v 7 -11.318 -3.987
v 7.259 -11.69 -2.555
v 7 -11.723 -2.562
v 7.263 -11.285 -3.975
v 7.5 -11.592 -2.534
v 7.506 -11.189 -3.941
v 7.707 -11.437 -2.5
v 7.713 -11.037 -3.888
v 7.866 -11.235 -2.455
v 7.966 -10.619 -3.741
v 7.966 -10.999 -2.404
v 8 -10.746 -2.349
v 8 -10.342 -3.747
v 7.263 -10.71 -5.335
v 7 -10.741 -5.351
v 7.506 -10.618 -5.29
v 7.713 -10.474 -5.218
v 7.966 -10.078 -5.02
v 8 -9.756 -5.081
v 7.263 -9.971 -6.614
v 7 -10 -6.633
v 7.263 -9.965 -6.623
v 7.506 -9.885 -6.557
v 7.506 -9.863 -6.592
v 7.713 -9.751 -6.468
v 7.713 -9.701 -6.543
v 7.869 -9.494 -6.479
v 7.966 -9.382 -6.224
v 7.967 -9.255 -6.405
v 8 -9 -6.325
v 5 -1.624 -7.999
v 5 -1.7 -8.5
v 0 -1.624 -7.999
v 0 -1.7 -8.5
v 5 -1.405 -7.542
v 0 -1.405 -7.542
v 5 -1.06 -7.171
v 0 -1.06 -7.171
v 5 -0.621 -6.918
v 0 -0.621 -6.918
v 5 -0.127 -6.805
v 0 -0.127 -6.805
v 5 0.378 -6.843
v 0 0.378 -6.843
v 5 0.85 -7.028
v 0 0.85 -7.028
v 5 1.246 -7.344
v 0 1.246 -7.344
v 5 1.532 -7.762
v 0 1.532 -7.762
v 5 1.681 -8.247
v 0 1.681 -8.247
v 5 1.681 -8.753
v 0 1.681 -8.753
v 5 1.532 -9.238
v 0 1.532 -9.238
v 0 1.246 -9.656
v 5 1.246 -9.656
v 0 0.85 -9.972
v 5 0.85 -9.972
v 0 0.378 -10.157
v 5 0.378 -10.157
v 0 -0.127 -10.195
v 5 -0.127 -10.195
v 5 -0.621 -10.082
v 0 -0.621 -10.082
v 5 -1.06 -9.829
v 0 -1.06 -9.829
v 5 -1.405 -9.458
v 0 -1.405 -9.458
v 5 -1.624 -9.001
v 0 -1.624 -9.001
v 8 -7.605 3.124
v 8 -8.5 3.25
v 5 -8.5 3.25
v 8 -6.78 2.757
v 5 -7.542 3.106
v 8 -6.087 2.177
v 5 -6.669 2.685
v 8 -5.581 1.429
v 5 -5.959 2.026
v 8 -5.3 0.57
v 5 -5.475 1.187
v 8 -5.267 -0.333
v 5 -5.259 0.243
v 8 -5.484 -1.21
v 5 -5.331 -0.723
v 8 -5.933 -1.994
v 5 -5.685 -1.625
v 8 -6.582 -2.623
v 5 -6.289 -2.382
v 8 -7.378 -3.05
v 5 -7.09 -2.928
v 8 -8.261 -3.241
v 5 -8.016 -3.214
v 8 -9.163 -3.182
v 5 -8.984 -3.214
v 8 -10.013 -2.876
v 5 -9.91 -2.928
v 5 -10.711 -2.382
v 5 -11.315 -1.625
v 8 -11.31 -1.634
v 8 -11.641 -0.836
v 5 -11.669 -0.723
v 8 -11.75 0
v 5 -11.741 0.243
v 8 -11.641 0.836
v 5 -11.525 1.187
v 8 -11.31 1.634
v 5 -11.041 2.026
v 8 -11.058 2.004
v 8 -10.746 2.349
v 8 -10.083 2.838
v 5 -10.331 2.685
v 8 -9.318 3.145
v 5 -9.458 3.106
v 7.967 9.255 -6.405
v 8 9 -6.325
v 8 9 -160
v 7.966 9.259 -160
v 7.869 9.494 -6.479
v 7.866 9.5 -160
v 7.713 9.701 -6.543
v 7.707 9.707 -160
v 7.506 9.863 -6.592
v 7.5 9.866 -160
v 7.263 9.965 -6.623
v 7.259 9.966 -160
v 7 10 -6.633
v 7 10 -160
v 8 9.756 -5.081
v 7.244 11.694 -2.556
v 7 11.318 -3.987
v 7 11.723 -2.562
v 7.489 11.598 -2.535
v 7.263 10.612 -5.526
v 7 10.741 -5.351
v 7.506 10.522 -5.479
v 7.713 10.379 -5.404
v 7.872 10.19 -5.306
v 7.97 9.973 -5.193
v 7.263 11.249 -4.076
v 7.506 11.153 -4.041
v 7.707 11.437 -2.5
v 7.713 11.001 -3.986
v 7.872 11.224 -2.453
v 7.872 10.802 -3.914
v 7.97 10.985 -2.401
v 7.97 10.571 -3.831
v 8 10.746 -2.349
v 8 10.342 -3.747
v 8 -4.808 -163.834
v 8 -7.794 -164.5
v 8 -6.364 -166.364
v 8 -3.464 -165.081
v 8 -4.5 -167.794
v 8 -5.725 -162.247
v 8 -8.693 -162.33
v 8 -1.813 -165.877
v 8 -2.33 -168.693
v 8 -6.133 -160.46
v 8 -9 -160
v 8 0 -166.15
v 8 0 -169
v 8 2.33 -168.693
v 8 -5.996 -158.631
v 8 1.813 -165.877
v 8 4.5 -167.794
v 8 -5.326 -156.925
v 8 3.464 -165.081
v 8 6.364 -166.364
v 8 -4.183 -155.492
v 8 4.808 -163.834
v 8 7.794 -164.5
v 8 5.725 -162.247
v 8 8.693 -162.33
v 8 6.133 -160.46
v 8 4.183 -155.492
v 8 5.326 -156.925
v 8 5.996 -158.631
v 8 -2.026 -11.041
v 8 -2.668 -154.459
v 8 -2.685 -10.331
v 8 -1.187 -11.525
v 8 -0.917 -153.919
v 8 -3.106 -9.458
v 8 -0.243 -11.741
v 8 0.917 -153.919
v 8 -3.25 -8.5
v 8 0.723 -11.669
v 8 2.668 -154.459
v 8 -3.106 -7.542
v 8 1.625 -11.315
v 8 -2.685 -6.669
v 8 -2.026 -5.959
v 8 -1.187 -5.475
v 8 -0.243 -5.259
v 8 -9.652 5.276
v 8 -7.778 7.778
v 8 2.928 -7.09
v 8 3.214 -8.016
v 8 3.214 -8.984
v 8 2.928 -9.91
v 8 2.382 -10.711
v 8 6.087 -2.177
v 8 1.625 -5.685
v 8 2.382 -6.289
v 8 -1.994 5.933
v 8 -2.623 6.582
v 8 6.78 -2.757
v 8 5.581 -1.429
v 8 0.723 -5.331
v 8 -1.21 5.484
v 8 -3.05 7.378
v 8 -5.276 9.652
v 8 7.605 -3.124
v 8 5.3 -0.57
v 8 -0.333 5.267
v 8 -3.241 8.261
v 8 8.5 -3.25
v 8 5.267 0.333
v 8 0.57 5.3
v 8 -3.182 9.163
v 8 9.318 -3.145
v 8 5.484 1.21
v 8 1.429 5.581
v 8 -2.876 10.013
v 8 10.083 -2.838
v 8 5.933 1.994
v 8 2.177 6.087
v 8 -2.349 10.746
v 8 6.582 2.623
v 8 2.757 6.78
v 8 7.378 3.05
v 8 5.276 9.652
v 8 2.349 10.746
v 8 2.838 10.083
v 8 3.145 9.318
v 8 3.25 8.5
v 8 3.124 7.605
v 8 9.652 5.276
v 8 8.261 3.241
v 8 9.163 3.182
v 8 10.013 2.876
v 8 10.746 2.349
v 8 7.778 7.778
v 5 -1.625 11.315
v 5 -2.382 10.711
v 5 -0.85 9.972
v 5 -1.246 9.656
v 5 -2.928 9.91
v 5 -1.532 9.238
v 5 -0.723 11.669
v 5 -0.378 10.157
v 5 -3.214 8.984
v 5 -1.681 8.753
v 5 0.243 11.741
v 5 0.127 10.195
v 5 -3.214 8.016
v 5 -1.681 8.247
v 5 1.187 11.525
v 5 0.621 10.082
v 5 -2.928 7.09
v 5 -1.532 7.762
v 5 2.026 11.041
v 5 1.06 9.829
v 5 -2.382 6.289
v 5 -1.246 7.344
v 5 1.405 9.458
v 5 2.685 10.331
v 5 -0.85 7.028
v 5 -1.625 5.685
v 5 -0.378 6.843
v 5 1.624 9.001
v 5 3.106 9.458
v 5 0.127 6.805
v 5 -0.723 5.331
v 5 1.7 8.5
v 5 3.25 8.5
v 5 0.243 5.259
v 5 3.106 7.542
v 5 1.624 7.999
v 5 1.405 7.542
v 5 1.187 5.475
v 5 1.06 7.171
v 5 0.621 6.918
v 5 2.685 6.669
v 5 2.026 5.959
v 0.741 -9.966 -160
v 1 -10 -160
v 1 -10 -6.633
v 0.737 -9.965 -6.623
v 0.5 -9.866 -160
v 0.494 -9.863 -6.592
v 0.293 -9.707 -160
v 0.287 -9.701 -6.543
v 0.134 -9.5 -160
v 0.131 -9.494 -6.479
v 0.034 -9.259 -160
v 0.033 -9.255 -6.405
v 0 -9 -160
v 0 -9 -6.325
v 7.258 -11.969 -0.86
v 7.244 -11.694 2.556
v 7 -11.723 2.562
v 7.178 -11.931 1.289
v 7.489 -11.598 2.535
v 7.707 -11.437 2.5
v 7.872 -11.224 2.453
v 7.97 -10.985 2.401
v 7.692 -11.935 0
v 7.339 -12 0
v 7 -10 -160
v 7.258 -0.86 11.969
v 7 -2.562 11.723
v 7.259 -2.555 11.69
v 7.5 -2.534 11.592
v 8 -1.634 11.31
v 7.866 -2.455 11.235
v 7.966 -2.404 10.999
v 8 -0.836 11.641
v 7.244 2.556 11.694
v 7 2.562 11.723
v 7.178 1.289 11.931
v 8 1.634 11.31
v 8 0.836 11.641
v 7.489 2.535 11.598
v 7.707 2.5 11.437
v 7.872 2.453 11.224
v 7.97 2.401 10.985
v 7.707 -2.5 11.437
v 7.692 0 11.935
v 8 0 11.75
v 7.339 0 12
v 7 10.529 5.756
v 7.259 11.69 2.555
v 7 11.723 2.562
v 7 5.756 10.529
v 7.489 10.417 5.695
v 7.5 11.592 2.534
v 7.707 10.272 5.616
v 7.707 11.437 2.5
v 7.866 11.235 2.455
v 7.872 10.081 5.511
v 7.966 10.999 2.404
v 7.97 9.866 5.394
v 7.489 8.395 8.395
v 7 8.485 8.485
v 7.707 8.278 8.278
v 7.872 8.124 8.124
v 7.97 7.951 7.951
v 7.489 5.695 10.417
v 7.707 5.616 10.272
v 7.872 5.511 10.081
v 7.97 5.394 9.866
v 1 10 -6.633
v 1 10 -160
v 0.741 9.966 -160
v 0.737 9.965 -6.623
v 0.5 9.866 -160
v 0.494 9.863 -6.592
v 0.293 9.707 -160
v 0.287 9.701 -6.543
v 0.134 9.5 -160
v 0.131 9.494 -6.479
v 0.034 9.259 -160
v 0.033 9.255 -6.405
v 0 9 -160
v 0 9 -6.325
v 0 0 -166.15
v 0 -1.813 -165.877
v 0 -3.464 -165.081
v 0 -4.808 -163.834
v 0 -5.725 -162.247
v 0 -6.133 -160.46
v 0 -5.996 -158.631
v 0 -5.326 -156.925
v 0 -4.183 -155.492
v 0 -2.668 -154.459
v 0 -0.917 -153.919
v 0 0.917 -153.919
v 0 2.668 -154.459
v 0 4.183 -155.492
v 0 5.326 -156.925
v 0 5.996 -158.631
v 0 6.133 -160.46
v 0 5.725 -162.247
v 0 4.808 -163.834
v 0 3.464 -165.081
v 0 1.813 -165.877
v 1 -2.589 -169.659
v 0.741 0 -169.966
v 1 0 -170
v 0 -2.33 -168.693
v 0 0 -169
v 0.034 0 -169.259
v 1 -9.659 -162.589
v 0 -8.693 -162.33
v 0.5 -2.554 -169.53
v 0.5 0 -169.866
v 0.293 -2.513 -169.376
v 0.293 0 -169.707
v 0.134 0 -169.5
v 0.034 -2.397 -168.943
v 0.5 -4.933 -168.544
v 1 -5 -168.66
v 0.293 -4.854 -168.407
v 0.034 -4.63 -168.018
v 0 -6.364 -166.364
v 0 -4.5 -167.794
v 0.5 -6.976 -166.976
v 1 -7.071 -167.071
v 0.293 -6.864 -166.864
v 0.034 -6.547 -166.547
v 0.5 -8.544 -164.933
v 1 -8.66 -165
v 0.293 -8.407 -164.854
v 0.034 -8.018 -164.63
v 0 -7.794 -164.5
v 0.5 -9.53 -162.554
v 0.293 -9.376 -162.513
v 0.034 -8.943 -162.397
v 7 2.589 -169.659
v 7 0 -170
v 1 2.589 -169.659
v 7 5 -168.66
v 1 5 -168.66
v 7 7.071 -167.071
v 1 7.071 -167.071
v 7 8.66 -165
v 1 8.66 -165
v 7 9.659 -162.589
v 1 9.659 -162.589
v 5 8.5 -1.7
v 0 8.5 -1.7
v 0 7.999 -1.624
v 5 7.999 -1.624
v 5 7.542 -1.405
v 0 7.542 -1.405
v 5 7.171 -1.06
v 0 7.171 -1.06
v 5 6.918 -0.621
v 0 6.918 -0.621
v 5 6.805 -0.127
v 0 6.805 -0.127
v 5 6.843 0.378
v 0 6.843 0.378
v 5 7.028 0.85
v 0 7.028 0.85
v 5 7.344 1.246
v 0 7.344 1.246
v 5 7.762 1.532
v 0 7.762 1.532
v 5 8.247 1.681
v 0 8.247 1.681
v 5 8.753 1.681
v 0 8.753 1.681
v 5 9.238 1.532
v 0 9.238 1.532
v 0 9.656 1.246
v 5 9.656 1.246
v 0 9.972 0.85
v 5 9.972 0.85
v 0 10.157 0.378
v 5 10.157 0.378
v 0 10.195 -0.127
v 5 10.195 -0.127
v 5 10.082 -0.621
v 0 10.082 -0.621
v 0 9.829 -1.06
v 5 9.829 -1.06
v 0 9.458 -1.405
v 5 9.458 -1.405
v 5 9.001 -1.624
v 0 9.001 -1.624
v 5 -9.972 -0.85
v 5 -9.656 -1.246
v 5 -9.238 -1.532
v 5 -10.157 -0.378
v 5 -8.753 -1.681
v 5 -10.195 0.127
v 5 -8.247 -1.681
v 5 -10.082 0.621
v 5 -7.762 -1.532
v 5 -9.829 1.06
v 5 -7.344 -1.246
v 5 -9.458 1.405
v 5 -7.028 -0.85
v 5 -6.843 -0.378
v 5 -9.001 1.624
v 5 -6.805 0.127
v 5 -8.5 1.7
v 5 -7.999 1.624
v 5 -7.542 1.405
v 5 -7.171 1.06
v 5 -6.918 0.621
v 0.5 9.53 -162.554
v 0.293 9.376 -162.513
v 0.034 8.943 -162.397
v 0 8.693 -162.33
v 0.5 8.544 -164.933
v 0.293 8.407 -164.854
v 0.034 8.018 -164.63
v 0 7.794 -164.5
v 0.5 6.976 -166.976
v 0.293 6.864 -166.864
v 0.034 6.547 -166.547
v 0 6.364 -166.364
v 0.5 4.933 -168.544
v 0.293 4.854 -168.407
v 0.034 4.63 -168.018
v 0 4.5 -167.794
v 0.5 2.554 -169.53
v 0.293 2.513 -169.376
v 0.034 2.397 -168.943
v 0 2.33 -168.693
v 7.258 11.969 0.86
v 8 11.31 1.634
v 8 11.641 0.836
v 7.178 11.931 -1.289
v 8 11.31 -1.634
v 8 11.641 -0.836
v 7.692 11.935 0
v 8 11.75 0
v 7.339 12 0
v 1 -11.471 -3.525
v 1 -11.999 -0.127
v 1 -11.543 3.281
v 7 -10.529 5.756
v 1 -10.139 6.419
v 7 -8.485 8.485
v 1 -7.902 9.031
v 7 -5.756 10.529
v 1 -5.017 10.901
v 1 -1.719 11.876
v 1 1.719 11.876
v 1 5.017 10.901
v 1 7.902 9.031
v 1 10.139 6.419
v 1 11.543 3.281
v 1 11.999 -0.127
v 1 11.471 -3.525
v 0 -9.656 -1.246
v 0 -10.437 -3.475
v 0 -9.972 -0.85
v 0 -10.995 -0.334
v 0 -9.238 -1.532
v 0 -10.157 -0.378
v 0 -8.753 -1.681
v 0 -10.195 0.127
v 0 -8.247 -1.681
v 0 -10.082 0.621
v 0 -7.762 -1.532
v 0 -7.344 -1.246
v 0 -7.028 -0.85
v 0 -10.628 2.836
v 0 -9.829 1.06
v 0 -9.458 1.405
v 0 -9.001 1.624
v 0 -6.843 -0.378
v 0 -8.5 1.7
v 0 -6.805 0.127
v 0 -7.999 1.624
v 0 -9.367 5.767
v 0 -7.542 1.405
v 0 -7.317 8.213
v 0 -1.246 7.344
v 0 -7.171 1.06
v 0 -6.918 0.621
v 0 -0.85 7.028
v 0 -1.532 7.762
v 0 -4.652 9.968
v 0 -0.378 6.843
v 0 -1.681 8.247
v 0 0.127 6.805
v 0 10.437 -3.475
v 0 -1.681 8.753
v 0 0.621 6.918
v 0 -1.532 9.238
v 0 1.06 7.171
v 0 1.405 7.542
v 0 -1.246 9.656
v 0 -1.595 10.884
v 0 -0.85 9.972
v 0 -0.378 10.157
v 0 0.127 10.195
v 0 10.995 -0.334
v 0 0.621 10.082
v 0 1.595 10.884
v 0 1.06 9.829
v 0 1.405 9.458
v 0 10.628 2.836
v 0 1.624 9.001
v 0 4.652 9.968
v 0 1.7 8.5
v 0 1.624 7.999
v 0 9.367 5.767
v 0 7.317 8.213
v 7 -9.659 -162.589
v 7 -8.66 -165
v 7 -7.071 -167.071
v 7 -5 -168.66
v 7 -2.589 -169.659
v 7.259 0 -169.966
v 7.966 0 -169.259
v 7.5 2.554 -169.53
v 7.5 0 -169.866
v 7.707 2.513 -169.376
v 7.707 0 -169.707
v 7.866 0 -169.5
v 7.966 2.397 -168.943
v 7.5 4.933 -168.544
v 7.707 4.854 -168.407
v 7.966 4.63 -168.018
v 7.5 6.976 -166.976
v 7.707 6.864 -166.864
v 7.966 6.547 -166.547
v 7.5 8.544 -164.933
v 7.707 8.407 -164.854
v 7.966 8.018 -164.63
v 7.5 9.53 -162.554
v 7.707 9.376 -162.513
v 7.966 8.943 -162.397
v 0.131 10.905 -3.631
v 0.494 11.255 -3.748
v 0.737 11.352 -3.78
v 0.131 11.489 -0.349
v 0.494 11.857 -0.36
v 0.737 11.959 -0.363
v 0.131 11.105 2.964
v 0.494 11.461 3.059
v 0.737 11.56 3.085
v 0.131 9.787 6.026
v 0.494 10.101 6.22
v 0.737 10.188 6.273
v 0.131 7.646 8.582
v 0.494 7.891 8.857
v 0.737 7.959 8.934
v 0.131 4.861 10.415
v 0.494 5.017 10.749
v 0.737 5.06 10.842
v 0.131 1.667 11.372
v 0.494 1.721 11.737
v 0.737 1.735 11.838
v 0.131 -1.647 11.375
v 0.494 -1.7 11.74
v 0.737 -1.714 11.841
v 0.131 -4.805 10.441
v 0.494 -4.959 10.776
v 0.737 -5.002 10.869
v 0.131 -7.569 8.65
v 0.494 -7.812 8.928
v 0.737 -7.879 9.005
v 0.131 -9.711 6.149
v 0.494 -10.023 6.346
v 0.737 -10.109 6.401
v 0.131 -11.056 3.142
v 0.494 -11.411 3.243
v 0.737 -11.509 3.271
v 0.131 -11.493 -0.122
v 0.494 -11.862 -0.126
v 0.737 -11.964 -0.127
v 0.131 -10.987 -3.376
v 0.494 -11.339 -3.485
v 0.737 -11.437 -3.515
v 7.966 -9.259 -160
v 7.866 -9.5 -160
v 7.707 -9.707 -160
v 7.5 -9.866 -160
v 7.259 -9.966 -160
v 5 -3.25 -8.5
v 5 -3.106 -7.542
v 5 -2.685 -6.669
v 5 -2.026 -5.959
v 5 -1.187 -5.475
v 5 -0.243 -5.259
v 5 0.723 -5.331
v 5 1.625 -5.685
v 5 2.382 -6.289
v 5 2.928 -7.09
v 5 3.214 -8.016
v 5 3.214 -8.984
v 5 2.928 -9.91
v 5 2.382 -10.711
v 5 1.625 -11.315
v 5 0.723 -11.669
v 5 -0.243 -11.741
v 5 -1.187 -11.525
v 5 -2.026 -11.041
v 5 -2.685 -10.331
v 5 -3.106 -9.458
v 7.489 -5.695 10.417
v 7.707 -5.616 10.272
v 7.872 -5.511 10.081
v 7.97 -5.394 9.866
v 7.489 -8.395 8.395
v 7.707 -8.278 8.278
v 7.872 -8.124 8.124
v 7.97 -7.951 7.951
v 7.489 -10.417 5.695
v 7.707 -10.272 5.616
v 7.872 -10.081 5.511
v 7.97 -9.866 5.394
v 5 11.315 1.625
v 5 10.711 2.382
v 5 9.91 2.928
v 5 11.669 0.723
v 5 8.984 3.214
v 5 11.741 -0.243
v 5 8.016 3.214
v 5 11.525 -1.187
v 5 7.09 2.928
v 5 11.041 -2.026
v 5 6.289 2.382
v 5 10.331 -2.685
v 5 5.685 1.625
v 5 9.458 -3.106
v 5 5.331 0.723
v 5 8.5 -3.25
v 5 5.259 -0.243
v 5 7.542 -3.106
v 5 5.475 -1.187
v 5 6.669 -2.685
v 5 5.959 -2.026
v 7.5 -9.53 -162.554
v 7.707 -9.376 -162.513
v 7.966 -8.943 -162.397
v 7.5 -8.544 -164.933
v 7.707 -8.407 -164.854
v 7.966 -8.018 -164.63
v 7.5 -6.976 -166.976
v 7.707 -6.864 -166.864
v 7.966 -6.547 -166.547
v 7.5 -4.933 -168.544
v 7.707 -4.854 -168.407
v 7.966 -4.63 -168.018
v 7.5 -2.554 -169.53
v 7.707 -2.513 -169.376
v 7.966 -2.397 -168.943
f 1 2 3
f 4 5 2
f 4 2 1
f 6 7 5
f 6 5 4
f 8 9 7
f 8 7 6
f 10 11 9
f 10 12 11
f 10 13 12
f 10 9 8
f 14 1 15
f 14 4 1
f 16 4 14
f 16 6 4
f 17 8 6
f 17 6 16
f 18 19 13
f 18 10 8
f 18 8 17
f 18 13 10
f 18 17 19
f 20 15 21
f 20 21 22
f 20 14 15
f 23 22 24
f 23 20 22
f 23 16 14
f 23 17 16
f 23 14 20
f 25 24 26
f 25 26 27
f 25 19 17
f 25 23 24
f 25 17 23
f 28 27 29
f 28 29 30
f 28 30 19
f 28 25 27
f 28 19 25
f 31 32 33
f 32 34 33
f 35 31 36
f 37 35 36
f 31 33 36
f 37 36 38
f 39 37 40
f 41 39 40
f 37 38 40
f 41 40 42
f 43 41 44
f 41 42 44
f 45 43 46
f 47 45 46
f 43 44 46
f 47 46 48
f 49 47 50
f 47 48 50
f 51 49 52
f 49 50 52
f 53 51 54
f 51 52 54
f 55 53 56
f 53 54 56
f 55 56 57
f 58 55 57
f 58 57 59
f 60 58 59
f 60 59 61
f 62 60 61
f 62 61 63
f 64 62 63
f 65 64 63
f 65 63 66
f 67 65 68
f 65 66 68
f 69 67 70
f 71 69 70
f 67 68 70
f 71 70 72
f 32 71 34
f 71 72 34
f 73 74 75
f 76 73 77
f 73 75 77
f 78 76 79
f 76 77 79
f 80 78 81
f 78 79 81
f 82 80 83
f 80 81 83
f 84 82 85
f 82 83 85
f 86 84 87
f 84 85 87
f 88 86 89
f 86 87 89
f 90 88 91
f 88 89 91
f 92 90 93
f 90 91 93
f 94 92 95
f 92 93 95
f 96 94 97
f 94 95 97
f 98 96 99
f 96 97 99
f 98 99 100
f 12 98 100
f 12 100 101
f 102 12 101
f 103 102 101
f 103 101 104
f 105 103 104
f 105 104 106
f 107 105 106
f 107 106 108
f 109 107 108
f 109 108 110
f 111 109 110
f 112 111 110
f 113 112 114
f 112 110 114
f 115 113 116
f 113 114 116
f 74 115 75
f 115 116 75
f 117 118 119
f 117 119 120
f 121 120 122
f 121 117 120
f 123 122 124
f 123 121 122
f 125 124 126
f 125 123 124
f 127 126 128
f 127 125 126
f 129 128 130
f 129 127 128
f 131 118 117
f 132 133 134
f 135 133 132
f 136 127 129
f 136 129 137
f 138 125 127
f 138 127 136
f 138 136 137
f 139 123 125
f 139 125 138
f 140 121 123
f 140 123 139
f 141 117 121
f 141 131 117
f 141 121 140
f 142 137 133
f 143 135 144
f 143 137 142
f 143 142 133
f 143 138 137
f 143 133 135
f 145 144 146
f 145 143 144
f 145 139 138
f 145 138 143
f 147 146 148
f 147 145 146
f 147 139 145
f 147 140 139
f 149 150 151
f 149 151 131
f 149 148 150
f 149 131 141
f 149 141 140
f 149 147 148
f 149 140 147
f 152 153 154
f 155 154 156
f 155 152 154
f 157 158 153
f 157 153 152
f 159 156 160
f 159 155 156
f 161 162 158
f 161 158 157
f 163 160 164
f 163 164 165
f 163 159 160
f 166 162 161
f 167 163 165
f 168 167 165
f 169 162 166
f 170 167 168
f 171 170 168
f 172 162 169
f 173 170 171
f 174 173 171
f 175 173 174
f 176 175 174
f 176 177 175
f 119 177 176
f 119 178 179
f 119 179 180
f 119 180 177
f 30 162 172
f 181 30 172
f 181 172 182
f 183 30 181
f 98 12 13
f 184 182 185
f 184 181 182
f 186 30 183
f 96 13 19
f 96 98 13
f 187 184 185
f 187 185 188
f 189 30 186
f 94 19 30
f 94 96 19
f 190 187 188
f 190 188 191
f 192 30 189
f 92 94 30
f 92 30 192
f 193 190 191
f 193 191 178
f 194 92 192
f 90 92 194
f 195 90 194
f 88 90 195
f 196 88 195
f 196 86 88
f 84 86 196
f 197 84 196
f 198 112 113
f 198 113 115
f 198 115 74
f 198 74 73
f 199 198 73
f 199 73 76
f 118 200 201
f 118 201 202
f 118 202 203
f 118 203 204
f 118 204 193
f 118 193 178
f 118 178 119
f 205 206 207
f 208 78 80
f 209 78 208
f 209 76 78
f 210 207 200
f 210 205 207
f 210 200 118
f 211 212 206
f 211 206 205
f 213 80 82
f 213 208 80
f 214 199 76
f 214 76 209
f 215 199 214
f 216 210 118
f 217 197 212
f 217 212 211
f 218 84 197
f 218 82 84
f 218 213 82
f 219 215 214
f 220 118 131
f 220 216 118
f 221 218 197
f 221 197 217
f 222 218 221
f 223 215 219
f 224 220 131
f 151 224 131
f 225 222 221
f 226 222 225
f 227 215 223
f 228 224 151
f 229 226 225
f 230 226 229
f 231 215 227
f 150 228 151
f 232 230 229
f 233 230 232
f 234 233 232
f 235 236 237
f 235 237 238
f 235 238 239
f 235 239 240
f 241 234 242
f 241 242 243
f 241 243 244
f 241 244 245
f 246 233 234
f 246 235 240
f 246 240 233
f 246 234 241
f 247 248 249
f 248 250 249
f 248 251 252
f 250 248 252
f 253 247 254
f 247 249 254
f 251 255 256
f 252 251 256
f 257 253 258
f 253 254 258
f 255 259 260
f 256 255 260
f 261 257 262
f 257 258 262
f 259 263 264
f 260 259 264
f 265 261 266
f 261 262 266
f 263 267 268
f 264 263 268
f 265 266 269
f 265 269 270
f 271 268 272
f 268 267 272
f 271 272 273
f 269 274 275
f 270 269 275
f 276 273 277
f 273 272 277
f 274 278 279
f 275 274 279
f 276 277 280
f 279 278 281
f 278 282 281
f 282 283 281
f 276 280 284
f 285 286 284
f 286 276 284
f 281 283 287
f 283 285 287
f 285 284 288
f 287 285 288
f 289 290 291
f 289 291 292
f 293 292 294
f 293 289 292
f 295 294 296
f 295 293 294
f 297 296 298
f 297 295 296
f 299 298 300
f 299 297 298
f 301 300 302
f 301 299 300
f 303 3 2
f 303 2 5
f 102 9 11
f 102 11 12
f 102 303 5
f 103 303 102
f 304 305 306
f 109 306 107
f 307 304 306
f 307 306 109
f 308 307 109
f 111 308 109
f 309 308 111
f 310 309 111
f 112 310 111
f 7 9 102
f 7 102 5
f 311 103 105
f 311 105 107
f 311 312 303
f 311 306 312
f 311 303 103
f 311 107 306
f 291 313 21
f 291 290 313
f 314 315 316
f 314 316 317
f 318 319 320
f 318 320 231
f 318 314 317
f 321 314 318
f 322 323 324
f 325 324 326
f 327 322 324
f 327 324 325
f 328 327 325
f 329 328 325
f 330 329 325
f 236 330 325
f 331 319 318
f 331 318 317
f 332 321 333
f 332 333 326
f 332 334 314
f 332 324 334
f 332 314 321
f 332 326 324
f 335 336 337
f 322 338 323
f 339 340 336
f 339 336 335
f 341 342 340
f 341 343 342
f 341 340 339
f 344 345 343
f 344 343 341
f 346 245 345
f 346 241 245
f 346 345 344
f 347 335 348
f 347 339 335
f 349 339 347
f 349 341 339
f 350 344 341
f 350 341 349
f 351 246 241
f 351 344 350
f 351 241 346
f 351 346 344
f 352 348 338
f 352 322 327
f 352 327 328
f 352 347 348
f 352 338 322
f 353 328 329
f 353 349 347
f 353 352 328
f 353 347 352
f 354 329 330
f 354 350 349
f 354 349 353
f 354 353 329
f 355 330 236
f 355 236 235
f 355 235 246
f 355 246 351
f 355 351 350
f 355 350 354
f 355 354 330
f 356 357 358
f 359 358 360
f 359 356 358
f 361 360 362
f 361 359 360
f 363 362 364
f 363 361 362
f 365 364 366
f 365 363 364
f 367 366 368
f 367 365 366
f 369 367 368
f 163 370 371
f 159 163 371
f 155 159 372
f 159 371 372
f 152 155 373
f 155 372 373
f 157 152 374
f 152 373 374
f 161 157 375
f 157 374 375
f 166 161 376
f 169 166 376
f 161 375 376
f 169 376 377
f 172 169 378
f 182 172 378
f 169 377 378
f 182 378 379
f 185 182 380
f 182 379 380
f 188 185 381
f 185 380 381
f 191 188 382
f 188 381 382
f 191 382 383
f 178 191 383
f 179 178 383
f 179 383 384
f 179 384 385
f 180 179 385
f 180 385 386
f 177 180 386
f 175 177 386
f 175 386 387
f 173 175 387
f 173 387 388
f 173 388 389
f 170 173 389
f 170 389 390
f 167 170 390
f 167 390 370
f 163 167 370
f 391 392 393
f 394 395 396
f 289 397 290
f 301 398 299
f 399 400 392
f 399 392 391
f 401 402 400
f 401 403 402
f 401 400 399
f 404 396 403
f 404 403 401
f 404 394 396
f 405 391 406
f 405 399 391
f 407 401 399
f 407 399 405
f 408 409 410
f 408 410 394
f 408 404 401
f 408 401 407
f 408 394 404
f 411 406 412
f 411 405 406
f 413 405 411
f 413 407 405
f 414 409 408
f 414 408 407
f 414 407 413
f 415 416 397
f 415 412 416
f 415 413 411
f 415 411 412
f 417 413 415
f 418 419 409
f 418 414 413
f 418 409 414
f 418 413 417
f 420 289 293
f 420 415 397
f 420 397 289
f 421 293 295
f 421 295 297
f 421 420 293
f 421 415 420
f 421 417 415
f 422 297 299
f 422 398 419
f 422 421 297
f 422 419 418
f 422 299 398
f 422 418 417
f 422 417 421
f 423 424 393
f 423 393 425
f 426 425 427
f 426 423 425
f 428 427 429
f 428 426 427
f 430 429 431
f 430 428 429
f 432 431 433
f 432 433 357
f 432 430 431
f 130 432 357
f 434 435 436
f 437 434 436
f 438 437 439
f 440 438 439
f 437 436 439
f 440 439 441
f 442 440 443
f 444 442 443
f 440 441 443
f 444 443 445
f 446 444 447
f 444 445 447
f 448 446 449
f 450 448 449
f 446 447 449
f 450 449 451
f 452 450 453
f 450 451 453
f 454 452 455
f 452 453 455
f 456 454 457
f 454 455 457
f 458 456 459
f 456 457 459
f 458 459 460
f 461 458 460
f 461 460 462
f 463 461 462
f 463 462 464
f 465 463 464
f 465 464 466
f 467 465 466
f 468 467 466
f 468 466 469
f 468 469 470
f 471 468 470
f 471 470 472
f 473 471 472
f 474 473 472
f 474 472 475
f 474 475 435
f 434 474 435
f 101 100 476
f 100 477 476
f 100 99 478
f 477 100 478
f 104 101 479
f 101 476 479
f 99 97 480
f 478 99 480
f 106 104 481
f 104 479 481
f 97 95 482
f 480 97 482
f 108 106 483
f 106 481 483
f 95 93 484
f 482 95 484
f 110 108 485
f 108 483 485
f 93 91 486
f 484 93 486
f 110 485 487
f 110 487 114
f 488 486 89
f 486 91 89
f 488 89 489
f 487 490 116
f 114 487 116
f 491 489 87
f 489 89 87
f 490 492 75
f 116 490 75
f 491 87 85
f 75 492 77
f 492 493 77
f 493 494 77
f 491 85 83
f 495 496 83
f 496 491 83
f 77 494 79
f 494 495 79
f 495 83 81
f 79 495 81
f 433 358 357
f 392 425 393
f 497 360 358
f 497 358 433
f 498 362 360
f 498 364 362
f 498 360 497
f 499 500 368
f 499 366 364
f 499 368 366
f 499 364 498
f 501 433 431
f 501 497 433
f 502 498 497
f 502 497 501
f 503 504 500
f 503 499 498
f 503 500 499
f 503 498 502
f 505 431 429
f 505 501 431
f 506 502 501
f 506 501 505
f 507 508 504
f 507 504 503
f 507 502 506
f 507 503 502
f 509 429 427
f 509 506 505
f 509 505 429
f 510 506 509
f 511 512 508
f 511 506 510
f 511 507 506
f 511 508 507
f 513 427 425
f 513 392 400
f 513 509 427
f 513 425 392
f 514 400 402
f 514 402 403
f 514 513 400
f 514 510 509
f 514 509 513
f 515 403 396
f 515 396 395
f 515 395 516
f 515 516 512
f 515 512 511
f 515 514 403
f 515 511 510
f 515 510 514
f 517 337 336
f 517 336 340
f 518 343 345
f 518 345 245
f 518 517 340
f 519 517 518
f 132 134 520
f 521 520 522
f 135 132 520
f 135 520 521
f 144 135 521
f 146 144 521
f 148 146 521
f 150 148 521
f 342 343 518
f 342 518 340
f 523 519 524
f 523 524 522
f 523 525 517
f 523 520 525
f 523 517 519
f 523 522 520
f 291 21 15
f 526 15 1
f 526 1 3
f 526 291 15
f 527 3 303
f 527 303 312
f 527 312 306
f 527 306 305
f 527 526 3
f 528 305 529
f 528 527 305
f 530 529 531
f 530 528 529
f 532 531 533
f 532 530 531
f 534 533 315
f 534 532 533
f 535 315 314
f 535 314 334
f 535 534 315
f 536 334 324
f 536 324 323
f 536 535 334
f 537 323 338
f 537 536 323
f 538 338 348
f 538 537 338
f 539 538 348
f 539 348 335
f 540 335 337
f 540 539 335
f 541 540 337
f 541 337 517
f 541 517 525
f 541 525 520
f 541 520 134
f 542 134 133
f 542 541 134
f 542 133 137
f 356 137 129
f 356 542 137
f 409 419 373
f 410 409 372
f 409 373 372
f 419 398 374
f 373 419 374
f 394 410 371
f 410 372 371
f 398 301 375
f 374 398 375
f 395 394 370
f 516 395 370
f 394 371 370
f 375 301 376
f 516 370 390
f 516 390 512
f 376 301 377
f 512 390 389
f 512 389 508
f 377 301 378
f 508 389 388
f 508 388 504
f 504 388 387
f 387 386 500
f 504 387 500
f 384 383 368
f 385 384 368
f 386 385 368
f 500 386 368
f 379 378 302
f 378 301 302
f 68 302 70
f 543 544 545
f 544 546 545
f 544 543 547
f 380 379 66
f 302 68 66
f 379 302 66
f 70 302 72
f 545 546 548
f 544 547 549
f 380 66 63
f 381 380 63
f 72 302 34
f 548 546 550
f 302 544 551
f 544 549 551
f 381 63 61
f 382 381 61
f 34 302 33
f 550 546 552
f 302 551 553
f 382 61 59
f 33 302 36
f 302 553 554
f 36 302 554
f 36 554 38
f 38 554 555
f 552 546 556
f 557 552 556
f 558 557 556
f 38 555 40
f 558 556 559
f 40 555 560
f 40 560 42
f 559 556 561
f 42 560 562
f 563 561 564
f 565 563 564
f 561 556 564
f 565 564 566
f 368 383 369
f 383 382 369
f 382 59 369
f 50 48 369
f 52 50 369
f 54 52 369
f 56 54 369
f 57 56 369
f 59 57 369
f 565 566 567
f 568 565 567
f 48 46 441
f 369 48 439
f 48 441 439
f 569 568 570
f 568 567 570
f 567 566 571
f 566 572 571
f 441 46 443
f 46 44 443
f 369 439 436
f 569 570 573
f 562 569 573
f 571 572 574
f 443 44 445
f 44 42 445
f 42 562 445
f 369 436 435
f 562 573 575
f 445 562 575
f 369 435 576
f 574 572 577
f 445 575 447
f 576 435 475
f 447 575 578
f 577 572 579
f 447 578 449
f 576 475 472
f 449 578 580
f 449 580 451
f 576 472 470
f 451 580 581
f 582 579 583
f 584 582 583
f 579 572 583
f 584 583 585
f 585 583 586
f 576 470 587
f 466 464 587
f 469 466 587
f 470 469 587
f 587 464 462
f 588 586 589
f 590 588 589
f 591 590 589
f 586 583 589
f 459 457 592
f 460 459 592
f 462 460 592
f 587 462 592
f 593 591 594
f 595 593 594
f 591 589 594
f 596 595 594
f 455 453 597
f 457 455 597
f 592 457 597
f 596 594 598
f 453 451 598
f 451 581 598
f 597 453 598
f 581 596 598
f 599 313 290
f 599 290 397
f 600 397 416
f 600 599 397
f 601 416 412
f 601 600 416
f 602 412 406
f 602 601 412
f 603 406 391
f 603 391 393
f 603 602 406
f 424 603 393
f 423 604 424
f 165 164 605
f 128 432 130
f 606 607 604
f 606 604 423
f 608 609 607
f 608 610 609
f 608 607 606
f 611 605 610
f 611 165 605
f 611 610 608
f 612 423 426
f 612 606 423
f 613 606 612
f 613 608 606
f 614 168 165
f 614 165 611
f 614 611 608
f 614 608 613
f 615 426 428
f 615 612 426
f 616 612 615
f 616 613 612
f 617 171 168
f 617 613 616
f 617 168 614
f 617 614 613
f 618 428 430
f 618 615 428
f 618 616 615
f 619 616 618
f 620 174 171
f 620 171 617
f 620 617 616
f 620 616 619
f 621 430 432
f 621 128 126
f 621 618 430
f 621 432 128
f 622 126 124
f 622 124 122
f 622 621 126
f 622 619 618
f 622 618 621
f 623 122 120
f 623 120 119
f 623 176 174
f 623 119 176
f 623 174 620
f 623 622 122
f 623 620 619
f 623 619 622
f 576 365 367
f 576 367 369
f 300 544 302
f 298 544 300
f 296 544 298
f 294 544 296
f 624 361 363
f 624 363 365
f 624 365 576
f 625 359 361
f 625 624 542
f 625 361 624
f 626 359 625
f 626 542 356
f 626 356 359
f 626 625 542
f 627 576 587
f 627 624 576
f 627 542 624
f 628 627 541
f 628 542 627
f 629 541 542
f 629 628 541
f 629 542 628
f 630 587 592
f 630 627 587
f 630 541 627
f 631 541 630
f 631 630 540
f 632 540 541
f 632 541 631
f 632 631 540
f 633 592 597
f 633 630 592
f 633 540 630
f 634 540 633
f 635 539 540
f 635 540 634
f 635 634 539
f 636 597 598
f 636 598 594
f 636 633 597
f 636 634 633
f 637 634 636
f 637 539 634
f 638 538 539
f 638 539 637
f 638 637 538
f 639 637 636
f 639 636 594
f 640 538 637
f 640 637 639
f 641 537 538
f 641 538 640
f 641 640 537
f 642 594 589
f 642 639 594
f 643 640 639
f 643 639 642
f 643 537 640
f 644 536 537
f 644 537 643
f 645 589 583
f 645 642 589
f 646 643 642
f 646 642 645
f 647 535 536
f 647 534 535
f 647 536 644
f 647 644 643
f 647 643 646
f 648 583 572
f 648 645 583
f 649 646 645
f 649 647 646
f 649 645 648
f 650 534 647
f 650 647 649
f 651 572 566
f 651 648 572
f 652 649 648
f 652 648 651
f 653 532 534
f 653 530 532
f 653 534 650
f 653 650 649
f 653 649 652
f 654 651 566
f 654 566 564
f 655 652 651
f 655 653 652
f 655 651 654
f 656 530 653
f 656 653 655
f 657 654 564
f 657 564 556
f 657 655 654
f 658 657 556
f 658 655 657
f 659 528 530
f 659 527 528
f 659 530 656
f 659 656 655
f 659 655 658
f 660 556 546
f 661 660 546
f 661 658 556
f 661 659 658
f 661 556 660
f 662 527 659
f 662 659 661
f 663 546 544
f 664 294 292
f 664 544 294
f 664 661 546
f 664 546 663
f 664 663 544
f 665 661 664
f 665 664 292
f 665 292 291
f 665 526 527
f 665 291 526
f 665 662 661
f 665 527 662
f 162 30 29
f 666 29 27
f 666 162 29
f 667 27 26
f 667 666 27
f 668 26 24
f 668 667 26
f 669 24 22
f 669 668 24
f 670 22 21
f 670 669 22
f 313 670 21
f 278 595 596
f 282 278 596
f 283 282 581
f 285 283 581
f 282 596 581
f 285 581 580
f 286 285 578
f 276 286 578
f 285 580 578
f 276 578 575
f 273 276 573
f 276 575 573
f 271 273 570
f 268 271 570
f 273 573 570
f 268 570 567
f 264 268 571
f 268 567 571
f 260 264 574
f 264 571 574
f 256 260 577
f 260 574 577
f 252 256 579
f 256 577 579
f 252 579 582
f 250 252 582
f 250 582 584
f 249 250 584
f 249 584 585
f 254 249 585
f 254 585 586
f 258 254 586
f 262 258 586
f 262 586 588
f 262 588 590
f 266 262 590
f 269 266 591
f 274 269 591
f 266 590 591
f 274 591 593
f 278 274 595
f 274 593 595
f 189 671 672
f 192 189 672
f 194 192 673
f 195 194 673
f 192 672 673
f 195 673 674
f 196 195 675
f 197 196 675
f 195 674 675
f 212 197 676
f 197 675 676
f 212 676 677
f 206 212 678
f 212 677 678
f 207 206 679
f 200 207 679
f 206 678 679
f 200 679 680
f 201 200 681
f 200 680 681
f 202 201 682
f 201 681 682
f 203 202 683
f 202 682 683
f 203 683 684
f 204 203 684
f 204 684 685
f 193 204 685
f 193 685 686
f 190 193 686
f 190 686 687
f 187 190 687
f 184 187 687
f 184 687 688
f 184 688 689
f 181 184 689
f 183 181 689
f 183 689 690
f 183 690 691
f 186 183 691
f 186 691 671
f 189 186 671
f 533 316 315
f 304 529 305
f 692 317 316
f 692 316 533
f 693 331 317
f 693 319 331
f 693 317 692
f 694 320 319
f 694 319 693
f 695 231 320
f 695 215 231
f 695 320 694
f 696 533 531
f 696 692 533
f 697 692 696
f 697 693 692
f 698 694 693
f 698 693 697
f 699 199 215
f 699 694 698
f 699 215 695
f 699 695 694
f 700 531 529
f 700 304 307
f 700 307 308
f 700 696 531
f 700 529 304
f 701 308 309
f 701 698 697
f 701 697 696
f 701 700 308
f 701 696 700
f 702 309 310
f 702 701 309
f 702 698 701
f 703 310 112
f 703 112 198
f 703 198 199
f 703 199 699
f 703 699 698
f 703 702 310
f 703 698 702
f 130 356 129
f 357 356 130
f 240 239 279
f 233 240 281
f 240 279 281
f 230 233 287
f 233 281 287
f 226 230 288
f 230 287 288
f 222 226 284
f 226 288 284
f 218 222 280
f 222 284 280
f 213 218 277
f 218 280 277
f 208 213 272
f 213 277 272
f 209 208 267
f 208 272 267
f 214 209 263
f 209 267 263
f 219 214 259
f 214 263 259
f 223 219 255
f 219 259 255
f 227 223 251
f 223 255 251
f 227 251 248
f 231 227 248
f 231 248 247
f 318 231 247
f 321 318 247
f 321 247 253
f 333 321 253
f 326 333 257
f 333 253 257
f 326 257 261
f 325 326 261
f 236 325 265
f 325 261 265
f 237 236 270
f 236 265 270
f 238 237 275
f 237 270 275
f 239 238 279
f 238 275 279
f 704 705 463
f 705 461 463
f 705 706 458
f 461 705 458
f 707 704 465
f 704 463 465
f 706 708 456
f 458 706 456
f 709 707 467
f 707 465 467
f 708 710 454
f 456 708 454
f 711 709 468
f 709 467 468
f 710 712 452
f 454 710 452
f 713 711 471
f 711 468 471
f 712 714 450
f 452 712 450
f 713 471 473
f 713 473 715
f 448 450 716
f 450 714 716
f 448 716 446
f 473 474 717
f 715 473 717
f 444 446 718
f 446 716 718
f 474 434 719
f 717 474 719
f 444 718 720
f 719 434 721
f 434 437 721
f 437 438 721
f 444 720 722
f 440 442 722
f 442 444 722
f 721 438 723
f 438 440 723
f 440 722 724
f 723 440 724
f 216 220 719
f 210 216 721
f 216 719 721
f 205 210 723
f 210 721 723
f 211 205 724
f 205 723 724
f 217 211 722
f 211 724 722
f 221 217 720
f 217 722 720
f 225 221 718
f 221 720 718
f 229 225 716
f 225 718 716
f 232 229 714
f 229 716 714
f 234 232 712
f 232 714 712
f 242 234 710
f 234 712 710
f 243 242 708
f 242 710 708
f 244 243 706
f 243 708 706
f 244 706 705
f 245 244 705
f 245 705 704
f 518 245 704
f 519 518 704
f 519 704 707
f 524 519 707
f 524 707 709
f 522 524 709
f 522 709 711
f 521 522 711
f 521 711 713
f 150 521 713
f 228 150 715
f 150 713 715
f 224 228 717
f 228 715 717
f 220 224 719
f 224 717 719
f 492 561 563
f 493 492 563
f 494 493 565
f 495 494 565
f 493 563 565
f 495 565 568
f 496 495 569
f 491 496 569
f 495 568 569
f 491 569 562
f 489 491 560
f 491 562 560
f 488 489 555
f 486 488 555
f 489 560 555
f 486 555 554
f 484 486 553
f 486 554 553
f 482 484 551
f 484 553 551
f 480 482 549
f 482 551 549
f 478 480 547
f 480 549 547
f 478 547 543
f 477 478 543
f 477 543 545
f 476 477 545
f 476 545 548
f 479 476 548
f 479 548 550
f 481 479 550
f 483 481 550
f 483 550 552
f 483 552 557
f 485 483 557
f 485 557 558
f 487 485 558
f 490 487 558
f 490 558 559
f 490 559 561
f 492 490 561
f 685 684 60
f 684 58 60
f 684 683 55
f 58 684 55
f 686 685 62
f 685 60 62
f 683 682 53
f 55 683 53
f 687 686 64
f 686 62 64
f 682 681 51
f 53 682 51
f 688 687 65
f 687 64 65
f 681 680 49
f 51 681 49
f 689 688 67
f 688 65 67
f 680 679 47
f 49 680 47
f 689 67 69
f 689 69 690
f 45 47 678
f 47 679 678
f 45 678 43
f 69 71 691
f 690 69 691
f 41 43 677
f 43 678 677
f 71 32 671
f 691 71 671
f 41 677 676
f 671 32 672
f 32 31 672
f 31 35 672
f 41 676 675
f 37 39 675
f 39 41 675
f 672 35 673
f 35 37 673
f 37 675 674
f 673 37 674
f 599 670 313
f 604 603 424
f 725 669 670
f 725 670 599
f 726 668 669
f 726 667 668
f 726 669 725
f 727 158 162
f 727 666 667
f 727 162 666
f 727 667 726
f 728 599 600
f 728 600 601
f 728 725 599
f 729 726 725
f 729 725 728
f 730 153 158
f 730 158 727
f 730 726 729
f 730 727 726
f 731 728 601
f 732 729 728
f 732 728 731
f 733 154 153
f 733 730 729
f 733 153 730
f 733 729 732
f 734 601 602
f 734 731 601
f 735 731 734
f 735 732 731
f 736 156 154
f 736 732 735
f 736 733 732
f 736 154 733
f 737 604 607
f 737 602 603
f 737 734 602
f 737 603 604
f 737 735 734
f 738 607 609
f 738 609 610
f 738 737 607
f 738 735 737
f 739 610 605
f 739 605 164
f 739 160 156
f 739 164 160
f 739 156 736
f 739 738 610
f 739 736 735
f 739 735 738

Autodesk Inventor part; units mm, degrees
ref_plane "YZ Plane" through (0, 0, 0) normal (1, 0, 0) x (0, 1, 0)
ref_plane "XZ Plane" through (0, 0, 0) normal (0, 1, 0) x (-1, 0, 0)
ref_plane "XY Plane" through (0, 0, 0) normal (0, 0, 1) x (1, 0, 0)
sketch "スケッチ1" plane through (0, 0, 0) normal (1, 0, 0) x (0, 1, 0)
  circle A0 centre (0, 0) radius 12
  line L0 (0, 0) -> (10, 0)
  line L1 (10, 0) -> (10, -170)
  line L2 (10, -170) -> (0, -170)
  line L3 (0, -170) -> (0, 0)
  point P0 (10, -6.6332)
  point P1 (0, -12)
  dimension "d0" = 24
  dimension "d1" = 170
  dimension "d2" = 10
extrude "押し出し1" add sketch "スケッチ1" along normal blind 8 contours A0 L1 L0 L3 | L3 L0 L1 A0
sketch "スケッチ2" plane through (8, 0, 0) normal (1, 0, 0) x (0, 0, -1)
  circle A0 centre (0, 0) radius 8.5
  point P0 (0, 8.5)
  dimension "d7" = 17
hole "穴1" at (8, 8.5, 0) direction (-1, 0, 0) diameter 3.4 end through all counterbore diameter 6.5 counterbore depth 3 clearance for "Socket Head Cap Screw" size "M3" standard "Ansi Metric M Profile"
pattern_circular "円形状パターン1" count 4 over 360 about axis through (0, 0, 0) along (1, 0, 0) of "穴1"
extrude "押し出し2" add sketch "スケッチ1" along normal blind 8 contours A0 L1 L2 L3
mirror "ミラー1" about plane through (0, 0, 0) normal (0, 1, 0) of "押し出し2"
sketch "スケッチ4" plane through (8, 0, 0) normal (1, 0, 0) x (0, 0, -1)
  line L0 (170, 10) -> (170, -10) projected
  point P0 (0, 0)
  point P1 (160, 0)
  dimension "d23" = 10
hole "穴2" at (8, 0, -160) direction (-1, 0, 0) diameter 12.3 end through all
fillet "フィレット1" radius 10 2 edges at (4, 10, -170) (4, -10, -170)
fillet "フィレット2" radius 1 6 edges at (8, -10, -83.3169) (8, 10, -83.3169) (8, 0, 12) (0, -10, -83.3169) (0, 10, -83.3169) (0, 0, 12)
sketch "スケッチ3" plane through (8, 0, 0) normal (1, 0, 0) x (0, 0, -1)
  point P0 (0, 0)
properties part number "base5" material "ABS プラスチック"
